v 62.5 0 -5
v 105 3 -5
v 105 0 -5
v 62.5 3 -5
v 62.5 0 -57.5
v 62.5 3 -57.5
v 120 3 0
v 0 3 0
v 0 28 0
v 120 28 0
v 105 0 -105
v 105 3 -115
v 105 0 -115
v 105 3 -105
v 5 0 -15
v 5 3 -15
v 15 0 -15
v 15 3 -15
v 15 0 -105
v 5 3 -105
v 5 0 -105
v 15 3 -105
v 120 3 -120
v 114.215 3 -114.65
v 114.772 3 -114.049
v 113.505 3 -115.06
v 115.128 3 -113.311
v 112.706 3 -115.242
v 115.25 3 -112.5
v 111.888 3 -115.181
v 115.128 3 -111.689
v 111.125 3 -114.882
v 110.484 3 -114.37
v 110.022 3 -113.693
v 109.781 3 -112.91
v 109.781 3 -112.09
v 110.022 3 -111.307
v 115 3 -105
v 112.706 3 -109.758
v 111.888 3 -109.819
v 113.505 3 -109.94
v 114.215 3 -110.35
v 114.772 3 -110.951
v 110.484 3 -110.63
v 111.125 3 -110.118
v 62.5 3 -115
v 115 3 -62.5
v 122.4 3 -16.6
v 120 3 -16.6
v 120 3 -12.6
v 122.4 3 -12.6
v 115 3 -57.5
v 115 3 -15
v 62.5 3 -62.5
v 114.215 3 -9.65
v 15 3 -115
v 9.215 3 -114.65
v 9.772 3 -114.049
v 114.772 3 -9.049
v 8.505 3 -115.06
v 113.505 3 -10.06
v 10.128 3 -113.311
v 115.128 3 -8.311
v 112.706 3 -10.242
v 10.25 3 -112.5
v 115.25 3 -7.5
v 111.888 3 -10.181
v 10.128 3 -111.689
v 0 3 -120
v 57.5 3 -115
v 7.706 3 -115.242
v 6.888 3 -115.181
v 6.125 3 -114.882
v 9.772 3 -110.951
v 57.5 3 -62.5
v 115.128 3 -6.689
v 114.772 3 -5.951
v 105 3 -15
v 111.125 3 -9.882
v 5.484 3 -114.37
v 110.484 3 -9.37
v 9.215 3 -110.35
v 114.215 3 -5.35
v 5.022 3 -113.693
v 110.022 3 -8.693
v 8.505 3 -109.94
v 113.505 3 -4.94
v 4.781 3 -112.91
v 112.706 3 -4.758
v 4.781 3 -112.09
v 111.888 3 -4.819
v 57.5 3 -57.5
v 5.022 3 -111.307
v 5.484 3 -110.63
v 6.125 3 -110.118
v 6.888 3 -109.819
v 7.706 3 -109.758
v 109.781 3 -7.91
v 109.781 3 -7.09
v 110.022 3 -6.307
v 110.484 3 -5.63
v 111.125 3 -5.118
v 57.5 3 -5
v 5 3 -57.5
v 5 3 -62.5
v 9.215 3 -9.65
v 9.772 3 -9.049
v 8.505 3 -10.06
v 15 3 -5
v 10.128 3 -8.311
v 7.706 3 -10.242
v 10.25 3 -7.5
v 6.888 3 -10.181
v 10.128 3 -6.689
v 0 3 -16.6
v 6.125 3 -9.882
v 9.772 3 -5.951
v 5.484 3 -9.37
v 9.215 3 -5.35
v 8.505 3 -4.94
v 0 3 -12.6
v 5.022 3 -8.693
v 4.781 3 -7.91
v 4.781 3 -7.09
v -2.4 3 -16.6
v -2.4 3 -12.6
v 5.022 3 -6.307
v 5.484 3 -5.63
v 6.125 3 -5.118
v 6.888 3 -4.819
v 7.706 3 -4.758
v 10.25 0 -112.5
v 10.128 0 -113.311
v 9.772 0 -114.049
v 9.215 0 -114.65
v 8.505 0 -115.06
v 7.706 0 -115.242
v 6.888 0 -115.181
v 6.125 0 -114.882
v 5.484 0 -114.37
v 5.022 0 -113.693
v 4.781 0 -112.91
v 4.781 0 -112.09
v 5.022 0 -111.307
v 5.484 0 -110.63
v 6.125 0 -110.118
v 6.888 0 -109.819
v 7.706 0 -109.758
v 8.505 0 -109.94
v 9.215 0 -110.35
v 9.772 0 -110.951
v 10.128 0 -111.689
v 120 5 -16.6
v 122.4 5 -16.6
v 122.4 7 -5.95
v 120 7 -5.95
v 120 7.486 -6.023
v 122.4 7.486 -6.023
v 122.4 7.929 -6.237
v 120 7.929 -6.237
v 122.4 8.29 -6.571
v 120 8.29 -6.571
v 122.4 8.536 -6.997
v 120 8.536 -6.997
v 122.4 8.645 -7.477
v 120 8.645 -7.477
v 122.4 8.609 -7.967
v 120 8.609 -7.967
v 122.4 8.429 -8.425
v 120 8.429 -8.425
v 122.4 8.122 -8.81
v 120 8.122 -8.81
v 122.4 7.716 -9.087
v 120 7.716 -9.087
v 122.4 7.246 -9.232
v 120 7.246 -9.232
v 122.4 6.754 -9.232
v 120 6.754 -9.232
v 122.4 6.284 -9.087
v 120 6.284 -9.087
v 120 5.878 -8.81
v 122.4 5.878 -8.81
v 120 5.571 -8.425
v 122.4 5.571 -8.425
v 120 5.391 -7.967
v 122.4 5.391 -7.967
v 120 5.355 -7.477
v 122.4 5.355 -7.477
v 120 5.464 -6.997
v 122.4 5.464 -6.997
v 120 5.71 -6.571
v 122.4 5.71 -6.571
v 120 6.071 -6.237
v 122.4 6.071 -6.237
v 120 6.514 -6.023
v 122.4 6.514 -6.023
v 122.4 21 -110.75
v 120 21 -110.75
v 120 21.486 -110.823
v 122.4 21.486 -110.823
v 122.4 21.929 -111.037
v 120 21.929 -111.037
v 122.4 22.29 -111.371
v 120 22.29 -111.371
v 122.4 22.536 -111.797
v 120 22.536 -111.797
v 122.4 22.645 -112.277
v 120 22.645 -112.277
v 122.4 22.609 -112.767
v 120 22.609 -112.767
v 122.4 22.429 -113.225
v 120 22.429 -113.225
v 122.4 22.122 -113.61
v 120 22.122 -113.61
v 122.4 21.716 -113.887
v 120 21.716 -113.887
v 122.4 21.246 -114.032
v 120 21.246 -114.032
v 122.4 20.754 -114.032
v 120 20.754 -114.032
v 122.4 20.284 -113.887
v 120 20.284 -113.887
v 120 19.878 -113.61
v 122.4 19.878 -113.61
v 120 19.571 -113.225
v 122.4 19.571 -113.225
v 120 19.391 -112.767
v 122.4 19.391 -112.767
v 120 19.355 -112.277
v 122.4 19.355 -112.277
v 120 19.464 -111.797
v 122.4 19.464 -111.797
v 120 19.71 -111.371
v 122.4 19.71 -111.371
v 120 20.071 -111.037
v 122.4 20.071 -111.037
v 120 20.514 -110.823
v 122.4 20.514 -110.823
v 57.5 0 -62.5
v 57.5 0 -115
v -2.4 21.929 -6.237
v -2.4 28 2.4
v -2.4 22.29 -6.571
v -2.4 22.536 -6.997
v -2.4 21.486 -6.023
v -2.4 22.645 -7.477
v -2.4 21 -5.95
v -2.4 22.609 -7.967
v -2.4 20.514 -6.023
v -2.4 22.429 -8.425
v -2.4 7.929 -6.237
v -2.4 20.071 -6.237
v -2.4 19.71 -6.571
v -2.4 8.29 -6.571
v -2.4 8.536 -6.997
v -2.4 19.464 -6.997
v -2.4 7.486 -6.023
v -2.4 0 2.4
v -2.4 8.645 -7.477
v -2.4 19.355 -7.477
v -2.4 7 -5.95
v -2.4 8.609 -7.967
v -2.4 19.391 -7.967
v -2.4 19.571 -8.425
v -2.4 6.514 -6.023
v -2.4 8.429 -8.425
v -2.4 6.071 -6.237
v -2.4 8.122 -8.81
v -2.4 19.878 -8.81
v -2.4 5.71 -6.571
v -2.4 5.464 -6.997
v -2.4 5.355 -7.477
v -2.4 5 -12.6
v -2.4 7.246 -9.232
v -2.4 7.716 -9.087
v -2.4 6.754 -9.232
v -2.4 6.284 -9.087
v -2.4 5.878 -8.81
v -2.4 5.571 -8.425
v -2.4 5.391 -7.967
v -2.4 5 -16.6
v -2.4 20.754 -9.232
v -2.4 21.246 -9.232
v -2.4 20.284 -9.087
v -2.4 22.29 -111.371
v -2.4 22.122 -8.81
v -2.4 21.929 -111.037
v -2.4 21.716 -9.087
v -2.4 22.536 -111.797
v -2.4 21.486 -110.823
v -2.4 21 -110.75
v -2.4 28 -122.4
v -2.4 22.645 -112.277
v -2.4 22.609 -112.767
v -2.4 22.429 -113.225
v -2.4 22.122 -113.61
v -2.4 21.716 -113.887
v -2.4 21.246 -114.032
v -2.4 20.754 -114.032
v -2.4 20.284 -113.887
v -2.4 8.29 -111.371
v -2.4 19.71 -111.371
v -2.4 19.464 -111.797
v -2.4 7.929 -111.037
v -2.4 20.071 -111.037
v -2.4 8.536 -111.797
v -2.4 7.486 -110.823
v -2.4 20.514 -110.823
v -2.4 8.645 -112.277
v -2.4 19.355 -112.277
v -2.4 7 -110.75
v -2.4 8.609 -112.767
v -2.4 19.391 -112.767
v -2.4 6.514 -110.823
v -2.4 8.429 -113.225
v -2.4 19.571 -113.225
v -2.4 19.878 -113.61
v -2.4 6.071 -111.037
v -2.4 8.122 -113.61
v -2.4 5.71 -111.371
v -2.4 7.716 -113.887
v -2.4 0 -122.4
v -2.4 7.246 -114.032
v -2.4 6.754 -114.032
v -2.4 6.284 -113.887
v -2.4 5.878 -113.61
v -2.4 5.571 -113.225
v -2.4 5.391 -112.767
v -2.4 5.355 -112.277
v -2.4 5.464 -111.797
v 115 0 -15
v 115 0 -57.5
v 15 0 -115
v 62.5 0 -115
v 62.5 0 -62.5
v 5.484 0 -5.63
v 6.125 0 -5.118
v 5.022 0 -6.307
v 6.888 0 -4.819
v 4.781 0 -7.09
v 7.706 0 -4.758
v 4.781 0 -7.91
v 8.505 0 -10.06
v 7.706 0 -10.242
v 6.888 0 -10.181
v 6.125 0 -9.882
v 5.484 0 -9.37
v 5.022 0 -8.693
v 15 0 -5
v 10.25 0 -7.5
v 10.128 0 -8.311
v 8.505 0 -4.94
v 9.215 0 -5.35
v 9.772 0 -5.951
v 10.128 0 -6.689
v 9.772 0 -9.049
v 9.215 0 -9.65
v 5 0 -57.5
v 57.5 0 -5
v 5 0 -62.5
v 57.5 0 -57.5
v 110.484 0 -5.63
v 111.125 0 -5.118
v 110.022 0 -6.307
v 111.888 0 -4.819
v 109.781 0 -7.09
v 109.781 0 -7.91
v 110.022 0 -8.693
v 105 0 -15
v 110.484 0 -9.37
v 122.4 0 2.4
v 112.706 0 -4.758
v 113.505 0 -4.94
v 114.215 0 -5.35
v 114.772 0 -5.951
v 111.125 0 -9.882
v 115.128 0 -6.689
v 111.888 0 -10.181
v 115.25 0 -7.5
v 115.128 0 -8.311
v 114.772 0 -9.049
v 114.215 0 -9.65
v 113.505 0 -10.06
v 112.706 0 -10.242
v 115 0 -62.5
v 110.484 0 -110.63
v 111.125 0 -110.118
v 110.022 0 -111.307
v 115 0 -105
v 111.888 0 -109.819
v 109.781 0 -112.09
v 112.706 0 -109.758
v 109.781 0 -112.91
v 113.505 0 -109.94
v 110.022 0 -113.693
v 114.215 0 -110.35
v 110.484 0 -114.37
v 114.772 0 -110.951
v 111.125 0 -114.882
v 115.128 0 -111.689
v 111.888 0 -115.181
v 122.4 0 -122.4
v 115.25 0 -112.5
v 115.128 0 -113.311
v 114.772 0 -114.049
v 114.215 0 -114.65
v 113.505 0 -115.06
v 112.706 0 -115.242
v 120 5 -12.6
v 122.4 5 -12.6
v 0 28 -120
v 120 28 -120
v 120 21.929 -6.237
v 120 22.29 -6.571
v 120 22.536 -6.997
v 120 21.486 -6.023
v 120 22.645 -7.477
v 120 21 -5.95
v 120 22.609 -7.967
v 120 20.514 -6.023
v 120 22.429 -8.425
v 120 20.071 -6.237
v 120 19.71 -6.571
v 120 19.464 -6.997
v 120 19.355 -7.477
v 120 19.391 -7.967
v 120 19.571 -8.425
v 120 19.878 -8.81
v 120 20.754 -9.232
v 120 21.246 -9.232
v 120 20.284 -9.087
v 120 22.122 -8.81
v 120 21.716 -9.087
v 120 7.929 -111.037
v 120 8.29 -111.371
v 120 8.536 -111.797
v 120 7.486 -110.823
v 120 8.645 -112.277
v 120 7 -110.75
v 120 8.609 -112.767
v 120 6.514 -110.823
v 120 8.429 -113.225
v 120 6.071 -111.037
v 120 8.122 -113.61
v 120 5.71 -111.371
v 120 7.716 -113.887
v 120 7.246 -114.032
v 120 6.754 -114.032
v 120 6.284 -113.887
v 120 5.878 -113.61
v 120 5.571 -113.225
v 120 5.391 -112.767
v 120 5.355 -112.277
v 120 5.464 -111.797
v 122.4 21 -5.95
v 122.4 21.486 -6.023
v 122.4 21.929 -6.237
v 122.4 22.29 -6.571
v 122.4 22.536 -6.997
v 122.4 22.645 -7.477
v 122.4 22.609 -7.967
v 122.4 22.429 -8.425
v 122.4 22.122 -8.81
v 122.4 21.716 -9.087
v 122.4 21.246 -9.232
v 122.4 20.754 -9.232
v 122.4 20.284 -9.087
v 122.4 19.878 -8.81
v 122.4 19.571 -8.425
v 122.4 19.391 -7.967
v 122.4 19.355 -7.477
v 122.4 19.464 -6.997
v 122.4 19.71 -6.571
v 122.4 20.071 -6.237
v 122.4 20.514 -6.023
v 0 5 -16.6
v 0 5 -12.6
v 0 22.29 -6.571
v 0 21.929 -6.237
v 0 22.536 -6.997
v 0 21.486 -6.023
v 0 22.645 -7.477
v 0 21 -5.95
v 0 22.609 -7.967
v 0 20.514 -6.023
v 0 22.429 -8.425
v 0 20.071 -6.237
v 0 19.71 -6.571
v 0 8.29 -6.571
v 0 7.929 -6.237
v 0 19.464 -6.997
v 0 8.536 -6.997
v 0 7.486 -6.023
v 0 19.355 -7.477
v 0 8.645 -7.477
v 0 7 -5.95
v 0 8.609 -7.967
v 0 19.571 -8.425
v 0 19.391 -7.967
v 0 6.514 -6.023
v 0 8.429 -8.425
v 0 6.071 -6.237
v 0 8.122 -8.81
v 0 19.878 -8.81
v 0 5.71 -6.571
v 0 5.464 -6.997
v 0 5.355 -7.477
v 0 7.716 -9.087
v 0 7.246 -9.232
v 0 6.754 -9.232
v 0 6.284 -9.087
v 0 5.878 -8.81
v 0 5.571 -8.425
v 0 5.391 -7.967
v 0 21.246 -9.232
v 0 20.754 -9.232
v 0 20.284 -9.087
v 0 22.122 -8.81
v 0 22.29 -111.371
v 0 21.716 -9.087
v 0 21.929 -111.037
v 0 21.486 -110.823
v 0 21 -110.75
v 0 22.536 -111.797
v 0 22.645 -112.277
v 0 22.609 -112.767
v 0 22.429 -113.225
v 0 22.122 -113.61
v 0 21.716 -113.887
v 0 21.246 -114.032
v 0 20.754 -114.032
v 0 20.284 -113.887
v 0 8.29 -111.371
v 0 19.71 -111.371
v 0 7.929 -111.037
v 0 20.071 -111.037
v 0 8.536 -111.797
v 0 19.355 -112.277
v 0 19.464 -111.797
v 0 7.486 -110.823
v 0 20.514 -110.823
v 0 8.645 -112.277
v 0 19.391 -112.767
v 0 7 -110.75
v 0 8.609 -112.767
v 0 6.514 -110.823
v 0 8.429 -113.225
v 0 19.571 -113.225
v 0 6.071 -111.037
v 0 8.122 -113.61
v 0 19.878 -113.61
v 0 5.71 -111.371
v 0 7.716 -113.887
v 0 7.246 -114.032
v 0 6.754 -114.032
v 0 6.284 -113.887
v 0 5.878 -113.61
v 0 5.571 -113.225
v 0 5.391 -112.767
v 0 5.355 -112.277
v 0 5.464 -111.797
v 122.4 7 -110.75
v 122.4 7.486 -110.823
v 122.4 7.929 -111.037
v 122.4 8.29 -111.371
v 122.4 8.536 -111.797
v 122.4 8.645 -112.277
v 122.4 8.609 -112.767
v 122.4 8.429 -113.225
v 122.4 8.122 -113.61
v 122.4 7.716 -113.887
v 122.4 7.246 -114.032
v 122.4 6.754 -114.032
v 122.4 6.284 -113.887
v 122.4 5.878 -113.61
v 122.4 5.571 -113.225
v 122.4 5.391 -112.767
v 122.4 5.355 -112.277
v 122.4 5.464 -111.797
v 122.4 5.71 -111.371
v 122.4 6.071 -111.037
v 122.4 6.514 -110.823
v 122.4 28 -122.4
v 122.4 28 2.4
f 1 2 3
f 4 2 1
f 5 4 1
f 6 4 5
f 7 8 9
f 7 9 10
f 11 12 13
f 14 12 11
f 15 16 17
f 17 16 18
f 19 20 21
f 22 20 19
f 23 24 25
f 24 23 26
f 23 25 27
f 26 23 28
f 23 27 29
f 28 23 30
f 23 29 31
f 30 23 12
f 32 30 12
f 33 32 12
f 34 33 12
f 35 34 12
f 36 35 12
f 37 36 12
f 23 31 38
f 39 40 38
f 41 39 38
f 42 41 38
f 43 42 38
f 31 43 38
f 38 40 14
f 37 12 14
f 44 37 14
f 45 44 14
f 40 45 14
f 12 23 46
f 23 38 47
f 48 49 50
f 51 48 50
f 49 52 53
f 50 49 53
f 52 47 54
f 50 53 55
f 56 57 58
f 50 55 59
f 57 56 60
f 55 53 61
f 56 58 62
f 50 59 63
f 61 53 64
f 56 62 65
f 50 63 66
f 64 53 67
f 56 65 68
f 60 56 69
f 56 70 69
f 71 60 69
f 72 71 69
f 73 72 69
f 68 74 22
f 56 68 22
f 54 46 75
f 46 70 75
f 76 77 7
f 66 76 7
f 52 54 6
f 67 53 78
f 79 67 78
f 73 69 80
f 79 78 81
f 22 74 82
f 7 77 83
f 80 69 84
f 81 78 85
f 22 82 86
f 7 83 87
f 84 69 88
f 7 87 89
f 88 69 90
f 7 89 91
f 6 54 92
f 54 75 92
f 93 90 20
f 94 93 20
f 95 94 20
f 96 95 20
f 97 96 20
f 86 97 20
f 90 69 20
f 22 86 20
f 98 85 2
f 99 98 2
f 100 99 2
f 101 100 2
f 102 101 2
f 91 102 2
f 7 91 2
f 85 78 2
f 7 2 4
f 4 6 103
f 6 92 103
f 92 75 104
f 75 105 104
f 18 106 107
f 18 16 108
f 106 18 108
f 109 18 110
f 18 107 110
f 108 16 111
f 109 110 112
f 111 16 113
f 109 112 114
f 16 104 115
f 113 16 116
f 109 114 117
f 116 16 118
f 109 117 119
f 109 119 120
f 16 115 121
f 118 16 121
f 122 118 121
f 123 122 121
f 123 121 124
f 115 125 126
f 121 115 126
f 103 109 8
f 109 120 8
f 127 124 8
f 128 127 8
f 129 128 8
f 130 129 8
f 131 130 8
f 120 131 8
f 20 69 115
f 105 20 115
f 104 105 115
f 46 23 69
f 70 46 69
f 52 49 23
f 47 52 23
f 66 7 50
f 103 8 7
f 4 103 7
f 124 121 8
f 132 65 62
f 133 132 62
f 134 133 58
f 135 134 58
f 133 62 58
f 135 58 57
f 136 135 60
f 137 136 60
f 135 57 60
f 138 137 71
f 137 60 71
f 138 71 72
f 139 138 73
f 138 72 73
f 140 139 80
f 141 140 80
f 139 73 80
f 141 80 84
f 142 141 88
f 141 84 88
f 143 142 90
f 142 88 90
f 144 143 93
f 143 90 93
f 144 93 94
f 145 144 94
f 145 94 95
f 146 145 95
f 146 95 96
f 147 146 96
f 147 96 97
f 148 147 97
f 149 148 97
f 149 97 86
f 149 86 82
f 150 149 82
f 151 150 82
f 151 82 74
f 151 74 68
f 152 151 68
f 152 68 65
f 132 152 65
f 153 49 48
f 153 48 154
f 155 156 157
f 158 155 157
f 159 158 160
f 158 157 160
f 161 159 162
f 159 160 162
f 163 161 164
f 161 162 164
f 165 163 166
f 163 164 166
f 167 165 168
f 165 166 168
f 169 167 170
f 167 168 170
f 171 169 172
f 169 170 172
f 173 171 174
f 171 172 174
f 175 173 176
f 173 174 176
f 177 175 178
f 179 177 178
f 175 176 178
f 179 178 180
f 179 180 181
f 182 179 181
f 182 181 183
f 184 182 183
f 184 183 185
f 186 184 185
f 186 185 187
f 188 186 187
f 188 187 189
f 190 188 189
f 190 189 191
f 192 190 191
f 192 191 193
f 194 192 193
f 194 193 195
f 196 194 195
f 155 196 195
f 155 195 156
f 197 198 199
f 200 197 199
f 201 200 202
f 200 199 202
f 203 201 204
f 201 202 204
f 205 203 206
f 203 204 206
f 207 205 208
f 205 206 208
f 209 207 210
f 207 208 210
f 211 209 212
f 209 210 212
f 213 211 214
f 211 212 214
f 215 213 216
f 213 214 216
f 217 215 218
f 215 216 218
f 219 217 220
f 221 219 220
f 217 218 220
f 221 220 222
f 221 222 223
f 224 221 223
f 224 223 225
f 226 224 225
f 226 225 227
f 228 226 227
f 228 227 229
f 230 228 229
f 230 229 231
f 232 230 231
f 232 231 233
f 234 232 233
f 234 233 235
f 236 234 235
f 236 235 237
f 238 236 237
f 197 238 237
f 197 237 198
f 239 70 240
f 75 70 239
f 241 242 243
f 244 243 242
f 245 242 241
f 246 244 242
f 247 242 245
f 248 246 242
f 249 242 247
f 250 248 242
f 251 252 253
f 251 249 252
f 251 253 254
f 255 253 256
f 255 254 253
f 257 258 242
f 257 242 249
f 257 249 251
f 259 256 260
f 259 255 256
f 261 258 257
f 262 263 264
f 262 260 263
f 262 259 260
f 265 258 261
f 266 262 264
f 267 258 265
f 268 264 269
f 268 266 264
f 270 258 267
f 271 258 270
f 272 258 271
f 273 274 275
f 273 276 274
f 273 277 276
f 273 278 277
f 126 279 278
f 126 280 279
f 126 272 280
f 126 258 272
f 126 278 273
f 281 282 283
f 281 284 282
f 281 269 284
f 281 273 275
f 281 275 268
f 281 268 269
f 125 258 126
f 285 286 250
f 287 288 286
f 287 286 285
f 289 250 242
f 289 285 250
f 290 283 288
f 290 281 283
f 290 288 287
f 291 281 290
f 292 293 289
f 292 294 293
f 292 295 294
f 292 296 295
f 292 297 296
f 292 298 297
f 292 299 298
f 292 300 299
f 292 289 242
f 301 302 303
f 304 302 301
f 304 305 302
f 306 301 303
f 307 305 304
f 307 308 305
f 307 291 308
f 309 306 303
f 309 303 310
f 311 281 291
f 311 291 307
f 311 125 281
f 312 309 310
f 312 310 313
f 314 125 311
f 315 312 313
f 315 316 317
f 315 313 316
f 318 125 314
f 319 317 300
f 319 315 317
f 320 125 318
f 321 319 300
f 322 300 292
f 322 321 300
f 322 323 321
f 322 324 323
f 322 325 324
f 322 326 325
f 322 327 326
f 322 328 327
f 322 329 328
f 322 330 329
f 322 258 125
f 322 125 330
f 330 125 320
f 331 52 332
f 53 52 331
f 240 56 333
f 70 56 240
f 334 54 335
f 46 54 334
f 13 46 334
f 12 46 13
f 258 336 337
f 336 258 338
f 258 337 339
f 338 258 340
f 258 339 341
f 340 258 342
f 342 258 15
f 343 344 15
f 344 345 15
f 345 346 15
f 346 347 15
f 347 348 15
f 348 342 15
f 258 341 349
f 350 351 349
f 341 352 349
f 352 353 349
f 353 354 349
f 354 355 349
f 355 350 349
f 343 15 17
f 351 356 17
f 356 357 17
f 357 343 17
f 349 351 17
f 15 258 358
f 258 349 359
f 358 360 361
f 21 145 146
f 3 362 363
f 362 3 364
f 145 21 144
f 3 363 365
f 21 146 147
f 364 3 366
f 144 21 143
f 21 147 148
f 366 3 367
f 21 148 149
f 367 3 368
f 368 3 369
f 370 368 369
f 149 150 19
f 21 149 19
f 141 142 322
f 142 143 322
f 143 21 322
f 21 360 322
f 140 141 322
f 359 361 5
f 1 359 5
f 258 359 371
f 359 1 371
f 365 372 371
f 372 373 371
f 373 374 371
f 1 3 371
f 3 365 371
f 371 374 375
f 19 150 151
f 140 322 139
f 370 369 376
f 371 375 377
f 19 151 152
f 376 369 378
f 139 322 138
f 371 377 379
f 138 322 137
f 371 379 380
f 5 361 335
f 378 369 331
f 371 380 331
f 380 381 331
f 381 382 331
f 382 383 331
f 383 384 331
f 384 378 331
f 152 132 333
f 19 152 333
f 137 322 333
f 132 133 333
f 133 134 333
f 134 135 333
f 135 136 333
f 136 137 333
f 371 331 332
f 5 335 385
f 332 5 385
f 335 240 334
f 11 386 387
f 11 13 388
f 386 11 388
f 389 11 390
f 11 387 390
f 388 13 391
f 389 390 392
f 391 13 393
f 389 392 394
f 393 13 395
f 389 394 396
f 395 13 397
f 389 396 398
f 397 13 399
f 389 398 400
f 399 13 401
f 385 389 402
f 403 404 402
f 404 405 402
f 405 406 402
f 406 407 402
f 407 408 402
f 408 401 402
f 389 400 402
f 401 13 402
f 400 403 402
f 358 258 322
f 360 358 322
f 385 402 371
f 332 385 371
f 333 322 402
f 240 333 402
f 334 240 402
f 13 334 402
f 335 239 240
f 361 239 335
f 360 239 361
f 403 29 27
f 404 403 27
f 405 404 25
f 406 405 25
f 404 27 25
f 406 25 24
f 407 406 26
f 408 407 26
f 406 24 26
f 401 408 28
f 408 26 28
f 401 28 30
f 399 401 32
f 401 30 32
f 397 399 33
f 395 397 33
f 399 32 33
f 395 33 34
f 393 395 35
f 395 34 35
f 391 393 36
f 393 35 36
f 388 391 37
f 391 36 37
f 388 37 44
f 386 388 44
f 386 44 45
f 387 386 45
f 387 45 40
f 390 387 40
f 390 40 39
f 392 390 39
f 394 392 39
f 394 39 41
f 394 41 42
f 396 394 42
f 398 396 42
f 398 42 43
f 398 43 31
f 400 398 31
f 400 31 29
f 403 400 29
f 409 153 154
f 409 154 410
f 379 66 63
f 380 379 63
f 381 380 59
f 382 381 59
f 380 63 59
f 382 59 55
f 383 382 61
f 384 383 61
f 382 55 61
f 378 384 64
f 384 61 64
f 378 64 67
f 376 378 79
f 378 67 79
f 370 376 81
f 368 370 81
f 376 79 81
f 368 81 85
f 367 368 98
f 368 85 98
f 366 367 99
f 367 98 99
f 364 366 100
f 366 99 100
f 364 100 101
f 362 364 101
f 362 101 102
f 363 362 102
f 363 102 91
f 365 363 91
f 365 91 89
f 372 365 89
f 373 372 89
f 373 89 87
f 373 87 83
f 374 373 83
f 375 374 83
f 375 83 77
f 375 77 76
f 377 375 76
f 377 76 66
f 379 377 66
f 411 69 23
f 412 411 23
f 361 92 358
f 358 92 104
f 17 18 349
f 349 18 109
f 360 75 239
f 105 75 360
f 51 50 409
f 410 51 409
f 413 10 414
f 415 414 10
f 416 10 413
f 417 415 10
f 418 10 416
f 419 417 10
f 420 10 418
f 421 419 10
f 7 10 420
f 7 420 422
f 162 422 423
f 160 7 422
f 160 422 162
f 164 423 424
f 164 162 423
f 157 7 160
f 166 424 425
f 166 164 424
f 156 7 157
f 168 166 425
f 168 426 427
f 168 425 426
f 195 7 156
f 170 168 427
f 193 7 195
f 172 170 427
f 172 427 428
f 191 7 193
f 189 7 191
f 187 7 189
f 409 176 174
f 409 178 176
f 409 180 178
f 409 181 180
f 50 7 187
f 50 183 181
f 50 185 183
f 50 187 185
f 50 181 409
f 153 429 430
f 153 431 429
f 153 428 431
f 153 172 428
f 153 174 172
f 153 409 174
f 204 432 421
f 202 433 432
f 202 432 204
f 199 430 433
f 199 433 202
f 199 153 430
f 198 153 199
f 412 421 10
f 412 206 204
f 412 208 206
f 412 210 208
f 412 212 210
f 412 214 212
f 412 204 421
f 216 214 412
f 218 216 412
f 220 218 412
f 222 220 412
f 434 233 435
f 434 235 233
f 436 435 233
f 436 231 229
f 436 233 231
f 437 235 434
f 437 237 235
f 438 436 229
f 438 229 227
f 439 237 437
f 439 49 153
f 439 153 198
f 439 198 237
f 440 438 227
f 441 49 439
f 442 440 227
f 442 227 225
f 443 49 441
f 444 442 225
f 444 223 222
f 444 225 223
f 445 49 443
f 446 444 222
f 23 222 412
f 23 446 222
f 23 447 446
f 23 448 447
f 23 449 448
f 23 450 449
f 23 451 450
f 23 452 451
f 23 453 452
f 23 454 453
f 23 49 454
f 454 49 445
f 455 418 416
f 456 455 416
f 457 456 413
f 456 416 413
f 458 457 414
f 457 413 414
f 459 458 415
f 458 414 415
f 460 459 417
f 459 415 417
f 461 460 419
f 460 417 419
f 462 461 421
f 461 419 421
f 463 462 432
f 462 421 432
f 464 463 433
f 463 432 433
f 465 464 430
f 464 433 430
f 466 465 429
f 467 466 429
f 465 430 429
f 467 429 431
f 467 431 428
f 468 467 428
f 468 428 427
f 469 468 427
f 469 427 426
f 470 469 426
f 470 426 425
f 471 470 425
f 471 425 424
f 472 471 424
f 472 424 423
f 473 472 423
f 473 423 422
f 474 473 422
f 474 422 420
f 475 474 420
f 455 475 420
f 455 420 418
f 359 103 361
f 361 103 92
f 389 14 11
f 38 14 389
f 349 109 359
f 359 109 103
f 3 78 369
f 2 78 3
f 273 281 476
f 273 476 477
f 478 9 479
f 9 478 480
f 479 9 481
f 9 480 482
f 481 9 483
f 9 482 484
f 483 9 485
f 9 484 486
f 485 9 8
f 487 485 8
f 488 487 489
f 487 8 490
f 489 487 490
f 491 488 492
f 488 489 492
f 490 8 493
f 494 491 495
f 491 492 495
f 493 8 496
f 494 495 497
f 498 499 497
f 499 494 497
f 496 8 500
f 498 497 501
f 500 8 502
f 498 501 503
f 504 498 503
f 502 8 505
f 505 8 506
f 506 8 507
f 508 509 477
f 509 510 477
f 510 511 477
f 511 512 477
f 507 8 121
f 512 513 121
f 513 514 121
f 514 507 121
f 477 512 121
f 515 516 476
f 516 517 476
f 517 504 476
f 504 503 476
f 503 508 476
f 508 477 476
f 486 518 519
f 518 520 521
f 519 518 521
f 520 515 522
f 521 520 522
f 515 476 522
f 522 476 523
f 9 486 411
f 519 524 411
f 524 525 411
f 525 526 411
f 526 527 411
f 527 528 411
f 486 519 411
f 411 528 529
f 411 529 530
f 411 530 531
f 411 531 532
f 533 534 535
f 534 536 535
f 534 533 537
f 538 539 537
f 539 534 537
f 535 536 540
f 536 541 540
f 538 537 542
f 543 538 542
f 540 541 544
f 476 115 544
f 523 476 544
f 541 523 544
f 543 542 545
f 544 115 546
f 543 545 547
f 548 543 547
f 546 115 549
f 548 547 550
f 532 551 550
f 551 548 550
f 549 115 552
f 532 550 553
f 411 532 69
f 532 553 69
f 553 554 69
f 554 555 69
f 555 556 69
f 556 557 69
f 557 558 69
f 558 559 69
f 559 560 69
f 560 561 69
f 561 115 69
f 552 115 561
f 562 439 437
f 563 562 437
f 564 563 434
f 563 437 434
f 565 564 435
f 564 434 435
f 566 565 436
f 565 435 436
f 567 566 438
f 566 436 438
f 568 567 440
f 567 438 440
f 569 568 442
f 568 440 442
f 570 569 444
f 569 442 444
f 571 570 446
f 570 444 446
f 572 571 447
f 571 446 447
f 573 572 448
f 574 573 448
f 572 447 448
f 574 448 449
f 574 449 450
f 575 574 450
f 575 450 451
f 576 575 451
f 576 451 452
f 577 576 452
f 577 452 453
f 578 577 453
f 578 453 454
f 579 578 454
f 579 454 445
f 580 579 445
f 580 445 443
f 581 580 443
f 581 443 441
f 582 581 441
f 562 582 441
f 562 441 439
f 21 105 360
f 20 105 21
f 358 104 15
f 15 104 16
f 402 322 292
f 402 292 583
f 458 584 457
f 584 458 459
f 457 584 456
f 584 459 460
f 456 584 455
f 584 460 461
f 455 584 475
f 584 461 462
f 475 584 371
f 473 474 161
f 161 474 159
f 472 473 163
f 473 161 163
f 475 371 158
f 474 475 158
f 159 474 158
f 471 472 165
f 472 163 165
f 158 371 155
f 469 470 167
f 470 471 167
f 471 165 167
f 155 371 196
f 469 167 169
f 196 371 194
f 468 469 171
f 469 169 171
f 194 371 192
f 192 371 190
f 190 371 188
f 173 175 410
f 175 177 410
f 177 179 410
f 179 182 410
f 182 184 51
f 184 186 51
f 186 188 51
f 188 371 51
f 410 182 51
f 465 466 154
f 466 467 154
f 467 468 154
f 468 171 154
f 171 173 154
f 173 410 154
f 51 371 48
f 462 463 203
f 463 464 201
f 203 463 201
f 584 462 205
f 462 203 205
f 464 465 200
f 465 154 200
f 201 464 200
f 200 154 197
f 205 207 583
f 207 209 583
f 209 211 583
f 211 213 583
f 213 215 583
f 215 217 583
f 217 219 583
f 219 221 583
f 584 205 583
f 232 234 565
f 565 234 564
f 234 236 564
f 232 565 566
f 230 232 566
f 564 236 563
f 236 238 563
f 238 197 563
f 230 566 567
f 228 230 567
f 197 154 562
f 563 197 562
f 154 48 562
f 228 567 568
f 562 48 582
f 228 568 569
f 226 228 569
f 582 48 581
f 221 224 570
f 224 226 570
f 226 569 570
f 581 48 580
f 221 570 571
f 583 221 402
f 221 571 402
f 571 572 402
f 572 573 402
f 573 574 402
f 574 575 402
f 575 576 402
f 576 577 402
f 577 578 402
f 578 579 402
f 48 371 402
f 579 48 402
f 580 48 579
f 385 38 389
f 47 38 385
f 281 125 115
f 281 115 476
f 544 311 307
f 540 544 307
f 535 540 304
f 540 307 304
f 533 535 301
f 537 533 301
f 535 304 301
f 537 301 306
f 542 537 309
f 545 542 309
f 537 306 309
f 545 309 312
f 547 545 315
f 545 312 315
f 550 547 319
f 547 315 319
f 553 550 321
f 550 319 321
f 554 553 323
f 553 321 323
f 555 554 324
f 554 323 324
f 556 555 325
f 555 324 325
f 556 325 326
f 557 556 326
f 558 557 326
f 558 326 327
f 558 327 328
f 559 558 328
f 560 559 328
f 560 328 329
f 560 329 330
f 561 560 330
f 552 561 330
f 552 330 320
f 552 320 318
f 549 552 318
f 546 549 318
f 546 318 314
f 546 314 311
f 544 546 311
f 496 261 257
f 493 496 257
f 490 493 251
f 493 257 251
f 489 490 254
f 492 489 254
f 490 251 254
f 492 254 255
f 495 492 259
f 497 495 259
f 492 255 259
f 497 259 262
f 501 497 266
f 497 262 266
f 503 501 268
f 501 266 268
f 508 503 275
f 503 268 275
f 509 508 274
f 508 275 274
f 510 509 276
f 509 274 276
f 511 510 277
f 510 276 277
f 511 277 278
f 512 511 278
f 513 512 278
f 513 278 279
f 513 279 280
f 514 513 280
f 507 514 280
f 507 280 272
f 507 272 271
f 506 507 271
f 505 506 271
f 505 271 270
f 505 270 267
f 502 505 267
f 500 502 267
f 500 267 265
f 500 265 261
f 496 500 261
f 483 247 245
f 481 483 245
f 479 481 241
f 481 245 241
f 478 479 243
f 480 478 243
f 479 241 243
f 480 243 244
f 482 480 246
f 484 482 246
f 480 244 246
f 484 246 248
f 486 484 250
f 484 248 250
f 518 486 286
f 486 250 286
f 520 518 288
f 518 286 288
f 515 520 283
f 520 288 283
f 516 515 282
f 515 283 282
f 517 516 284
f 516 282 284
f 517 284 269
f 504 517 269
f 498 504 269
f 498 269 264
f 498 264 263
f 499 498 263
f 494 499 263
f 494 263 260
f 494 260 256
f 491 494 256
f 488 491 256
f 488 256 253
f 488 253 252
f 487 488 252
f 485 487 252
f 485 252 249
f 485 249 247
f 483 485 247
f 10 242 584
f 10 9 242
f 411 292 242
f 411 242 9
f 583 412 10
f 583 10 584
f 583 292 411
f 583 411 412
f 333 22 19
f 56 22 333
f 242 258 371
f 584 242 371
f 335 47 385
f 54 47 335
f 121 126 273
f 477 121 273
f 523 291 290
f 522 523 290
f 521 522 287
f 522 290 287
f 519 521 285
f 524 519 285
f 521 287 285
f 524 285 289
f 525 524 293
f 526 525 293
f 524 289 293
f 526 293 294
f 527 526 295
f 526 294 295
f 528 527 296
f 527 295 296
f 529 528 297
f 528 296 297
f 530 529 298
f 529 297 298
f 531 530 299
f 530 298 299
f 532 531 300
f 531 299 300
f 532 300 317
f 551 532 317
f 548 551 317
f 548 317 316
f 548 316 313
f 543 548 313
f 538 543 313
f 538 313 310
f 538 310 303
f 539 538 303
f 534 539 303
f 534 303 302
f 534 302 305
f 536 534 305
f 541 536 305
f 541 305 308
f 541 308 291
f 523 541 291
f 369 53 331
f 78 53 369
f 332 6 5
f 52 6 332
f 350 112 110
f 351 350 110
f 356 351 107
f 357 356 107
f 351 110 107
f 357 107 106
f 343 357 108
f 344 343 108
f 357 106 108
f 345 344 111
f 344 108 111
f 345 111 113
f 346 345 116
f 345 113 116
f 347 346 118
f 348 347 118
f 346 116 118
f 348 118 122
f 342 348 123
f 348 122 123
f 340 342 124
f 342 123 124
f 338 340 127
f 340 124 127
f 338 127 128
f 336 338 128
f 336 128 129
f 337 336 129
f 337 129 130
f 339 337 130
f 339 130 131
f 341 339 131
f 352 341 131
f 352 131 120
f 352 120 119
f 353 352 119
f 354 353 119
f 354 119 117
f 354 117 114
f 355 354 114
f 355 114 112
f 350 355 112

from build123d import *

# Parameters (mm, degrees)
SKETCH1_W                      = 120
SKETCH1_H                      = 120
BOSS_EXTRUDE1_DEPTH            = 3
CUT_EXTRUDE1_REACH             = 5
CUT_EXTRUDE1_DIRECTION_2_DEPTH = 1
CUT_EXTRUDE2_REACH             = 5
SKETCH3_R                      = 2.75
SKETCH5_W                      = 124.8
SKETCH5_H                      = 124.8
SKETCH5_W_2                    = 120
SKETCH5_H_2                    = 120
BOSS_EXTRUDE2_DEPTH            = 28
SKETCH6_R                      = 1.65
CUT_EXTRUDE3_DEPTH             = 125.8
SKETCH7_W                      = 4
SKETCH7_H                      = 2
CUT_EXTRUDE4_DEPTH             = 125.8


with BuildPart() as part:
    # Sketch1 → Boss-Extrude1 (new body)
    with BuildSketch(Plane(origin=(0, 0, 0), x_dir=(1, 0, 0), z_dir=(0, 1, 0))):
        with Locations((60, 60)):
            Rectangle(SKETCH1_W, SKETCH1_H)
    extrude(amount=BOSS_EXTRUDE1_DEPTH)

    # Sketch2 → Cut-Extrude1 (cut, up to next)
    with BuildSketch(Plane(origin=(0, 3, 0), x_dir=(1, 0, 0), z_dir=(0, 1, 0)), mode=Mode.PRIVATE) as cut_extrude1_sk1:
        Polygon((15, 115), (57.5, 115), (57.5, 62.5), (5, 62.5), (5, 105), (15, 105), align=None)
    cut_extrude1_tool1 = extrude(cut_extrude1_sk1.sketch, amount=-CUT_EXTRUDE1_REACH, mode=Mode.PRIVATE) & part.part
    add(cut_extrude1_tool1.solids().sort_by_distance((32.05, 3, -87.95))[0], mode=Mode.SUBTRACT)
    # Sketch2 → Cut-Extrude1 (cut, up to next)
    with BuildSketch(Plane(origin=(0, 3, 0), x_dir=(1, 0, 0), z_dir=(0, 1, 0)), mode=Mode.PRIVATE) as cut_extrude1_sk2:
        Polygon((62.5, 5), (62.5, 57.5), (115, 57.5), (115, 15), (105, 15), (105, 5), align=None)
    cut_extrude1_tool2 = extrude(cut_extrude1_sk2.sketch, amount=-CUT_EXTRUDE1_REACH, mode=Mode.PRIVATE) & part.part
    add(cut_extrude1_tool2.solids().sort_by_distance((87.95, 3, -32.05))[0], mode=Mode.SUBTRACT)
    # Sketch2 → Cut-Extrude1 (cut, up to next)
    with BuildSketch(Plane(origin=(0, 3, 0), x_dir=(1, 0, 0), z_dir=(0, 1, 0)), mode=Mode.PRIVATE) as cut_extrude1_sk3:
        Polygon((15, 5), (57.5, 5), (57.5, 57.5), (5, 57.5), (5, 15), (15, 15), align=None)
    cut_extrude1_tool3 = extrude(cut_extrude1_sk3.sketch, amount=-CUT_EXTRUDE1_REACH, mode=Mode.PRIVATE) & part.part
    add(cut_extrude1_tool3.solids().sort_by_distance((32.05, 3, -32.05))[0], mode=Mode.SUBTRACT)
    # Sketch2 → Cut-Extrude1 (cut, up to next)
    with BuildSketch(Plane(origin=(0, 3, 0), x_dir=(1, 0, 0), z_dir=(0, 1, 0)), mode=Mode.PRIVATE) as cut_extrude1_sk4:
        Polygon((115, 62.5), (62.5, 62.5), (62.5, 115), (105, 115), (105, 105), (115, 105), align=None)
    cut_extrude1_tool4 = extrude(cut_extrude1_sk4.sketch, amount=-CUT_EXTRUDE1_REACH, mode=Mode.PRIVATE) & part.part
    add(cut_extrude1_tool4.solids().sort_by_distance((87.95, 3, -87.95))[0], mode=Mode.SUBTRACT)

    # Sketch2 → Cut-Extrude1 direction 2 (cut)
    with BuildSketch(Plane(origin=(0, 3, 0), x_dir=(1, 0, 0), z_dir=(0, 1, 0))):
        Polygon((15, 115), (57.5, 115), (57.5, 62.5), (5, 62.5), (5, 105), (15, 105), align=None)
        Polygon((62.5, 5), (62.5, 57.5), (115, 57.5), (115, 15), (105, 15), (105, 5), align=None)
        Polygon((15, 5), (57.5, 5), (57.5, 57.5), (5, 57.5), (5, 15), (15, 15), align=None)
        Polygon((115, 62.5), (62.5, 62.5), (62.5, 115), (105, 115), (105, 105), (115, 105), align=None)
    extrude(amount=CUT_EXTRUDE1_DIRECTION_2_DEPTH, mode=Mode.SUBTRACT)

    # Sketch3 → Cut-Extrude2 (cut, up to next)
    with BuildSketch(Plane(origin=(0, 3, 0), x_dir=(1, 0, 0), z_dir=(0, 1, 0)), mode=Mode.PRIVATE) as cut_extrude2_sk1:
        with Locations((7.5, 112.5)):
            Circle(SKETCH3_R)
    cut_extrude2_tool1 = extrude(cut_extrude2_sk1.sketch, amount=-CUT_EXTRUDE2_REACH, mode=Mode.PRIVATE) & part.part
    add(cut_extrude2_tool1.solids().sort_by_distance((7.5, 3, -112.5))[0], mode=Mode.SUBTRACT)
    # Sketch3 → Cut-Extrude2 (cut, up to next)
    with BuildSketch(Plane(origin=(0, 3, 0), x_dir=(1, 0, 0), z_dir=(0, 1, 0)), mode=Mode.PRIVATE) as cut_extrude2_sk2:
        with Locations((112.5, 112.5)):
            Circle(SKETCH3_R)
    cut_extrude2_tool2 = extrude(cut_extrude2_sk2.sketch, amount=-CUT_EXTRUDE2_REACH, mode=Mode.PRIVATE) & part.part
    add(cut_extrude2_tool2.solids().sort_by_distance((112.5, 3, -112.5))[0], mode=Mode.SUBTRACT)
    # Sketch3 → Cut-Extrude2 (cut, up to next)
    with BuildSketch(Plane(origin=(0, 3, 0), x_dir=(1, 0, 0), z_dir=(0, 1, 0)), mode=Mode.PRIVATE) as cut_extrude2_sk3:
        with Locations((112.5, 7.5)):
            Circle(SKETCH3_R)
    cut_extrude2_tool3 = extrude(cut_extrude2_sk3.sketch, amount=-CUT_EXTRUDE2_REACH, mode=Mode.PRIVATE) & part.part
    add(cut_extrude2_tool3.solids().sort_by_distance((112.5, 3, -7.5))[0], mode=Mode.SUBTRACT)
    # Sketch3 → Cut-Extrude2 (cut, up to next)
    with BuildSketch(Plane(origin=(0, 3, 0), x_dir=(1, 0, 0), z_dir=(0, 1, 0)), mode=Mode.PRIVATE) as cut_extrude2_sk4:
        with Locations((7.5, 7.5)):
            Circle(SKETCH3_R)
    cut_extrude2_tool4 = extrude(cut_extrude2_sk4.sketch, amount=-CUT_EXTRUDE2_REACH, mode=Mode.PRIVATE) & part.part
    add(cut_extrude2_tool4.solids().sort_by_distance((7.5, 3, -7.5))[0], mode=Mode.SUBTRACT)

    # Sketch5 → Boss-Extrude2 (add)
    with BuildSketch(Plane(origin=(0, 0, 0), x_dir=(1, 0, 0), z_dir=(0, 1, 0))):
        with Locations((60, 60)):
            Rectangle(SKETCH5_W, SKETCH5_H)
        with Locations((60, 60)):
            Rectangle(SKETCH5_W_2, SKETCH5_H_2, mode=Mode.SUBTRACT)
    extrude(amount=BOSS_EXTRUDE2_DEPTH)

    # Sketch6 → Cut-Extrude3 (cut, through all)
    with BuildSketch(Plane.ZY.offset(2.4)):
        with Locations((-112.4, 21)):
            Circle(SKETCH6_R)
        with Locations((-112.4, 7)):
            Circle(SKETCH6_R)
        with Locations((-7.6, 7)):
            Circle(SKETCH6_R)
        with Locations((-7.6, 21)):
            Circle(SKETCH6_R)
    extrude(amount=-CUT_EXTRUDE3_DEPTH, mode=Mode.SUBTRACT)

    # Sketch7 → Cut-Extrude4 (cut, through all)
    with BuildSketch(Plane.ZY.offset(2.4)):
        with Locations((-14.6, 4)):
            Rectangle(SKETCH7_W, SKETCH7_H)
    extrude(amount=-CUT_EXTRUDE4_DEPTH, mode=Mode.SUBTRACT)


solid = part.part
